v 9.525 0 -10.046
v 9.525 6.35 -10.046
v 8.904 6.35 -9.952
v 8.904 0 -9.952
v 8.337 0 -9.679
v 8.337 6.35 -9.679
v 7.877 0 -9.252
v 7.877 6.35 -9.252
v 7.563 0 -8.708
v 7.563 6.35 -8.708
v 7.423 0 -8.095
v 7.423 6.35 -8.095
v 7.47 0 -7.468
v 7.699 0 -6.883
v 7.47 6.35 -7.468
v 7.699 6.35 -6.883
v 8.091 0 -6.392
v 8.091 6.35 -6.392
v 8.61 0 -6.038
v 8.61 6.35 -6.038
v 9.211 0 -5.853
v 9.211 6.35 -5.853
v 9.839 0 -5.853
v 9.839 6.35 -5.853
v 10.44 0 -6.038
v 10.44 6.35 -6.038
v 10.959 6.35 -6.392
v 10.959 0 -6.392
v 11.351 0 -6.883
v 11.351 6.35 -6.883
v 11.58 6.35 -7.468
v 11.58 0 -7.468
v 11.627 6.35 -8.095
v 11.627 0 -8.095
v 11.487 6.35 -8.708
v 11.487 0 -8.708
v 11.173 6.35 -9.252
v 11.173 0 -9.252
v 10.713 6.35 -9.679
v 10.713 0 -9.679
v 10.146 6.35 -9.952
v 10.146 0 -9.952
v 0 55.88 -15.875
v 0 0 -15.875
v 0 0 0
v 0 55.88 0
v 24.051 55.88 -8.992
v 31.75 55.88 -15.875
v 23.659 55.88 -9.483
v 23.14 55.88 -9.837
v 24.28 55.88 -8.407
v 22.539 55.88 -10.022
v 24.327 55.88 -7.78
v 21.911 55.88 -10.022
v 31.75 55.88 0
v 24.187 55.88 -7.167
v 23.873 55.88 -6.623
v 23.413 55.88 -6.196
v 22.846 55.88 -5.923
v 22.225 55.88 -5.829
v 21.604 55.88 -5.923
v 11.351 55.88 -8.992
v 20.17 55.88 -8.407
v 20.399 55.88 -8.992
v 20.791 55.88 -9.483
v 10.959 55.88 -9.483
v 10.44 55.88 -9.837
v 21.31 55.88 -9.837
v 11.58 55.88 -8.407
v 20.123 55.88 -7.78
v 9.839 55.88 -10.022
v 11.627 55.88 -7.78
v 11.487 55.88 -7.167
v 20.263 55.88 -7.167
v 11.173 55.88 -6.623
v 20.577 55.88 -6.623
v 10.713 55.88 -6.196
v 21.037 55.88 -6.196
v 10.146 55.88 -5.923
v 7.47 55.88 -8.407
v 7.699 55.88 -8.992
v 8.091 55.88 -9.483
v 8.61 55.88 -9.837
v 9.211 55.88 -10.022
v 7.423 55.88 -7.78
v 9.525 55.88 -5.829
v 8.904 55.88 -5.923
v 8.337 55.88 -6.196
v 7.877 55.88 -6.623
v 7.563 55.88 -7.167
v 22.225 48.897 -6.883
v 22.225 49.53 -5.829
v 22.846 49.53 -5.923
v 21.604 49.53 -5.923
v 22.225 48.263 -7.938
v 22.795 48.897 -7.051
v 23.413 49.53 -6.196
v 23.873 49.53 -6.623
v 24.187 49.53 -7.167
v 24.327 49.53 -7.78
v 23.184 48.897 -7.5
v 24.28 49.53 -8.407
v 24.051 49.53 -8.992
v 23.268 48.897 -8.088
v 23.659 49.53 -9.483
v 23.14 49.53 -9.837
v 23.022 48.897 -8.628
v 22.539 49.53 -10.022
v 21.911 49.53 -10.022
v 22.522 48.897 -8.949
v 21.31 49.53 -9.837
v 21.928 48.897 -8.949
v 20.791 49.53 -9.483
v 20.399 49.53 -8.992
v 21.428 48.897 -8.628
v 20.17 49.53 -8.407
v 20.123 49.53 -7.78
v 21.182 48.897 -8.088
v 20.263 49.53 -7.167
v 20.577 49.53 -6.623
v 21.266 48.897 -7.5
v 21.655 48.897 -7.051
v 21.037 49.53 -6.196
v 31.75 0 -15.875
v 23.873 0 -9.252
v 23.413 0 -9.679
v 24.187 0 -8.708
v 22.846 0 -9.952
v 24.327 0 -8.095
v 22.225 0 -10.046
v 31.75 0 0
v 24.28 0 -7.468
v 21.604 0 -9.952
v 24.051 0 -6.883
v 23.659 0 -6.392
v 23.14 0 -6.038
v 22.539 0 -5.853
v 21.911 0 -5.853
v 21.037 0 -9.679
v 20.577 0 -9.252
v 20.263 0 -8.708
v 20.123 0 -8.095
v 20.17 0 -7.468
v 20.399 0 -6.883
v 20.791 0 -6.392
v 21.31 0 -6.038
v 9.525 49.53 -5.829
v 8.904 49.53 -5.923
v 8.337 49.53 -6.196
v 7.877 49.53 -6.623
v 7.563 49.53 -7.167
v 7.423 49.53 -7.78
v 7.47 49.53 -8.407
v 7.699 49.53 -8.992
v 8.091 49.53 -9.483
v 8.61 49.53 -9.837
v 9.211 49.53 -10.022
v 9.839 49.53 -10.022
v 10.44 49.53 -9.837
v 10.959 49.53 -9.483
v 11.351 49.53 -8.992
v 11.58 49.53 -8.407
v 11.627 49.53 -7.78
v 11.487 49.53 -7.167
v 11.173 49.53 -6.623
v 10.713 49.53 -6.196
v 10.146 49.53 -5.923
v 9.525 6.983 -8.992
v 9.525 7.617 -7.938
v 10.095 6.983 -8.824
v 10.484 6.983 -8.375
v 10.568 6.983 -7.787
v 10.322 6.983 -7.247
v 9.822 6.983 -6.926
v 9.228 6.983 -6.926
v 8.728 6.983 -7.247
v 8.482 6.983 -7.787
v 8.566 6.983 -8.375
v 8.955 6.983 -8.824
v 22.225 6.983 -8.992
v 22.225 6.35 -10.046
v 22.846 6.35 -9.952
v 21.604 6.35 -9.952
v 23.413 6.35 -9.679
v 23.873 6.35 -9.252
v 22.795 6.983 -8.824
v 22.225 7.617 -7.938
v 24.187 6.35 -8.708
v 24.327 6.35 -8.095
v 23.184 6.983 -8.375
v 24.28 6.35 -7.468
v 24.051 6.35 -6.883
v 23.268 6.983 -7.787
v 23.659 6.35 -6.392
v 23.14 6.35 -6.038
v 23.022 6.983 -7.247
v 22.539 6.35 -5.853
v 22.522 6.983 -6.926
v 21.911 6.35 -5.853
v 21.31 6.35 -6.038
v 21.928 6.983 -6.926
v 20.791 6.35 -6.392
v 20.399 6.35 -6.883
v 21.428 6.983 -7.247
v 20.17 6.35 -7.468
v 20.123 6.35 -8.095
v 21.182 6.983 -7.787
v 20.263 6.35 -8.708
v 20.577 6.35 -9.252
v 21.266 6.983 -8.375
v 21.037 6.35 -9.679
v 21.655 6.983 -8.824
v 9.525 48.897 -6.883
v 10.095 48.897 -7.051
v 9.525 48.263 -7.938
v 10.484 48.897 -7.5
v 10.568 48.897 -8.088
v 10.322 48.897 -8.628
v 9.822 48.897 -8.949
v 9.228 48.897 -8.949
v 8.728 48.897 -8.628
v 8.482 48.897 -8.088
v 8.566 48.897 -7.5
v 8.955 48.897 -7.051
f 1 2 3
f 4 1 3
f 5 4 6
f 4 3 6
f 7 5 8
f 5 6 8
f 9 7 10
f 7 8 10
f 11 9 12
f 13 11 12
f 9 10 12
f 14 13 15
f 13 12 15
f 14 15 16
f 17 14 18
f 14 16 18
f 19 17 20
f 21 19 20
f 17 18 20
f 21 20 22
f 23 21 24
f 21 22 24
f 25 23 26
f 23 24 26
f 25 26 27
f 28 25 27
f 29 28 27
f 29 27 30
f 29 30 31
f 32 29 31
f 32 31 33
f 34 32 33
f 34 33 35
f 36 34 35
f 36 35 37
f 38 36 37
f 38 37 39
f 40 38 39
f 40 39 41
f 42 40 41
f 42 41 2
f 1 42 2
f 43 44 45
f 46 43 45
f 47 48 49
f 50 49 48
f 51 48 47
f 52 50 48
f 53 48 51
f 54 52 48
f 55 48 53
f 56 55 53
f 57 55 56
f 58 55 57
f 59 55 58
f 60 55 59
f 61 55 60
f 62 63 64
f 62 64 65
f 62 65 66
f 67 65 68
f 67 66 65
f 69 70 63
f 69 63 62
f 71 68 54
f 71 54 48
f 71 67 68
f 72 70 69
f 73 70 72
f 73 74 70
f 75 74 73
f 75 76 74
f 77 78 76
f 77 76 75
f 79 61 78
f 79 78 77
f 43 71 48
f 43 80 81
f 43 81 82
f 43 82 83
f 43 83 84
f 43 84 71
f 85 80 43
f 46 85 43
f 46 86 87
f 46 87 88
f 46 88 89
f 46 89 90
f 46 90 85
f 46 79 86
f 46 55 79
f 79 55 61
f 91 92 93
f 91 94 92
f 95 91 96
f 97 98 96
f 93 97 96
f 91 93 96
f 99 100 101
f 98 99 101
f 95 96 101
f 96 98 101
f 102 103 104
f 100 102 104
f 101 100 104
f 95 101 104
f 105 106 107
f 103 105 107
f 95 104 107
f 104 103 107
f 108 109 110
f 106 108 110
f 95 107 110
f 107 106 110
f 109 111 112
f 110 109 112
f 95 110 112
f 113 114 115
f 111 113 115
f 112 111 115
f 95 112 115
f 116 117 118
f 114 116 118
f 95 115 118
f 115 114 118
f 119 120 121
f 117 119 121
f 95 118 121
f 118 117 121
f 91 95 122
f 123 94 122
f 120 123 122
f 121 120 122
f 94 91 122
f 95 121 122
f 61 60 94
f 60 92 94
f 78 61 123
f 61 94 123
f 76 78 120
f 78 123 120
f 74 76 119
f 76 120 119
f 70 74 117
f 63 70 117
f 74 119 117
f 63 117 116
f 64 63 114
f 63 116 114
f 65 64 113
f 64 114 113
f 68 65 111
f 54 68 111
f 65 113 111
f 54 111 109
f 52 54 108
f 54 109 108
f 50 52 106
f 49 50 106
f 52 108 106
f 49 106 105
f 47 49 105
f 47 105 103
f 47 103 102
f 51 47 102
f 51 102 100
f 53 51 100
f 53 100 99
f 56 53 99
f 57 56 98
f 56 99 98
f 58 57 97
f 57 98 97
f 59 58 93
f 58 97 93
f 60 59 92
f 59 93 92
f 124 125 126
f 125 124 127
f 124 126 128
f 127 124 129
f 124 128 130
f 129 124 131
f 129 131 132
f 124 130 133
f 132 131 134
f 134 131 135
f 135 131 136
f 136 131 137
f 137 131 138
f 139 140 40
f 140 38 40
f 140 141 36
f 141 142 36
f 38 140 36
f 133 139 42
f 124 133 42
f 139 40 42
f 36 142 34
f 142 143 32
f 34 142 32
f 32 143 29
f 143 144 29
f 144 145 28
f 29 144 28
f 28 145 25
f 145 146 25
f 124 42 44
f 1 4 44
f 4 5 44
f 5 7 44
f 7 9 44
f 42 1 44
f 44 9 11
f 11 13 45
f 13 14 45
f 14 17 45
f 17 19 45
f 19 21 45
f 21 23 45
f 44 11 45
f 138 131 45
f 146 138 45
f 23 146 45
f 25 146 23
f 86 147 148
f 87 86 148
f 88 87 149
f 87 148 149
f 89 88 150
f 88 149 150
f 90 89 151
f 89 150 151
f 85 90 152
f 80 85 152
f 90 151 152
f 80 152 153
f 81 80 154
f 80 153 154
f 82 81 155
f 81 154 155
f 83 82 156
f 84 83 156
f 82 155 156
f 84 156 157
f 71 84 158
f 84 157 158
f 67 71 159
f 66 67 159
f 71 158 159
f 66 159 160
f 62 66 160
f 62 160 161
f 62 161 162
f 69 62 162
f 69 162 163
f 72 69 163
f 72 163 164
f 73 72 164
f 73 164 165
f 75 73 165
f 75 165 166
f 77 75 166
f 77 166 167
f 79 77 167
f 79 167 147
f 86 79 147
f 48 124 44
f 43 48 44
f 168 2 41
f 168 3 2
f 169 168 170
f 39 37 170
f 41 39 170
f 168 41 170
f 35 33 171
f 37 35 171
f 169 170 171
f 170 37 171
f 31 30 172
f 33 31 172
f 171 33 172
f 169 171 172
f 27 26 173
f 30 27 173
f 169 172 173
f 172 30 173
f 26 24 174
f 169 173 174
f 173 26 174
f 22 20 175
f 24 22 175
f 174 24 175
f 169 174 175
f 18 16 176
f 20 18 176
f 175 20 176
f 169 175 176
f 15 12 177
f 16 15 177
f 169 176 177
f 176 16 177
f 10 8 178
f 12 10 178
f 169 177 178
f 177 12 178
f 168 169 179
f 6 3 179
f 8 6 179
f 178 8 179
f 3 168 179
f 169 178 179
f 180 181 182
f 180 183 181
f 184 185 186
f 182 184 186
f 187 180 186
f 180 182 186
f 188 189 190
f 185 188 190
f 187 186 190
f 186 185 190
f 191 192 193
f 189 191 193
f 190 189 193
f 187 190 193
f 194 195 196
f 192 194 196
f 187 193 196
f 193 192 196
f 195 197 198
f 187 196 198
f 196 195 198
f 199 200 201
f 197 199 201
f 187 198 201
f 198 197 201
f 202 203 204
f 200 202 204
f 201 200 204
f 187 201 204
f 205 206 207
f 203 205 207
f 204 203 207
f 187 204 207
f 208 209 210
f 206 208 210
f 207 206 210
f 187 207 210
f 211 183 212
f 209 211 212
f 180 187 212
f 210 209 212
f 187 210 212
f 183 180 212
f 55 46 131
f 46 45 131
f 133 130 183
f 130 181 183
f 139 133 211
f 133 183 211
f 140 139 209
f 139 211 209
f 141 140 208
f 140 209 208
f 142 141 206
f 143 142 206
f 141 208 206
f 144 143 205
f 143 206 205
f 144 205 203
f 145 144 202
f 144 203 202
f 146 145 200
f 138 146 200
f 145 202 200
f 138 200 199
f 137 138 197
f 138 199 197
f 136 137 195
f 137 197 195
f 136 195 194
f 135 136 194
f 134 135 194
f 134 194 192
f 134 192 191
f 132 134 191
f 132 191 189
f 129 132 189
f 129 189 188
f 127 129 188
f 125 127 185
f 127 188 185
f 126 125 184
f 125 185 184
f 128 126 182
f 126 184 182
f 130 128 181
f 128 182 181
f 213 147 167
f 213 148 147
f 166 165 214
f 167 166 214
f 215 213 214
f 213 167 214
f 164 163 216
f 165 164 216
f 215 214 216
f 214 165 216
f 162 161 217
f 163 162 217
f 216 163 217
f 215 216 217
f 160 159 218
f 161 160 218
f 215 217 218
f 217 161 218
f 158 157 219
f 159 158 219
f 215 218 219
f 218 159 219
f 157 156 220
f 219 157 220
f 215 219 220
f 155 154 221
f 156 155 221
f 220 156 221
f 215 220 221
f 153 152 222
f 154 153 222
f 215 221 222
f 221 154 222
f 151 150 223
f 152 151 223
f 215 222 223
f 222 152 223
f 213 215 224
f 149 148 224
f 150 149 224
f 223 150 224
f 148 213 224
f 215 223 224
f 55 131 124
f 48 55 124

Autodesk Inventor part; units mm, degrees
ref_plane "YZ Plane" through (0, 0, 0) normal (1, 0, 0) x (0, 1, 0)
ref_plane "XZ Plane" through (0, 0, 0) normal (0, 1, 0) x (-1, 0, 0)
ref_plane "XY Plane" through (0, 0, 0) normal (0, 0, 1) x (1, 0, 0)
sketch "Sketch1" plane through (0, 0, 0) normal (0, 1, 0) x (-1, 0, 0)
  line L0 (0, 0) -> (-31.75, 0)
  line L1 (-31.75, 0) -> (-31.75, -15.875)
  line L2 (-31.75, -15.875) -> (0, -15.875)
  line L3 (0, -15.875) -> (0, 0)
  dimension "d0" = 15.875
  dimension "d1" = 31.75
extrude "Extrusion1" add sketch "Sketch1" along normal blind 55.88
sketch "Sketch2" plane through (0, 55.88, 0) normal (0, 1, 0) x (1, 0, 0)
  line L0 (0, 15.875) -> (0, 0) projected
  line L1 (31.75, 0) -> (31.75, 15.875) projected
  line L2 (31.75, 15.875) -> (0, 15.875) projected
  line L3 (0, 0) -> (31.75, 0) projected
  point P0 (9.525, 7.9375)
  point P1 (22.225, 7.9375)
  dimension "d5" = 12.7
  dimension "d25" = 15.875
  dimension "d26" = 7.9375
  dimension "d27" = 9.525
hole "Hole1" at (9.525, 55.88, -7.9375) at (22.225, 55.88, -7.9375) direction (0, -1, 0) diameter 4.2164 depth 6.35 tip angle 118
sketch "Sketch3" plane through (0, 0, 0) normal (0, -1, 0) x (1, 0, 0)
  circle A0 centre (9.525, -7.9375) radius 2.1082 projected
  circle A1 centre (22.225, -7.9375) radius 2.1082 projected
  point P0 (0, 0)
hole "Hole2" at (9.525, 0, -7.9375) at (22.225, 0, -7.9375) direction (0, 1, 0) diameter 4.2164 depth 6.35 tip angle 118
equation "\"d26\" = 0.5 * d25"
properties part number "Garalite Support"
